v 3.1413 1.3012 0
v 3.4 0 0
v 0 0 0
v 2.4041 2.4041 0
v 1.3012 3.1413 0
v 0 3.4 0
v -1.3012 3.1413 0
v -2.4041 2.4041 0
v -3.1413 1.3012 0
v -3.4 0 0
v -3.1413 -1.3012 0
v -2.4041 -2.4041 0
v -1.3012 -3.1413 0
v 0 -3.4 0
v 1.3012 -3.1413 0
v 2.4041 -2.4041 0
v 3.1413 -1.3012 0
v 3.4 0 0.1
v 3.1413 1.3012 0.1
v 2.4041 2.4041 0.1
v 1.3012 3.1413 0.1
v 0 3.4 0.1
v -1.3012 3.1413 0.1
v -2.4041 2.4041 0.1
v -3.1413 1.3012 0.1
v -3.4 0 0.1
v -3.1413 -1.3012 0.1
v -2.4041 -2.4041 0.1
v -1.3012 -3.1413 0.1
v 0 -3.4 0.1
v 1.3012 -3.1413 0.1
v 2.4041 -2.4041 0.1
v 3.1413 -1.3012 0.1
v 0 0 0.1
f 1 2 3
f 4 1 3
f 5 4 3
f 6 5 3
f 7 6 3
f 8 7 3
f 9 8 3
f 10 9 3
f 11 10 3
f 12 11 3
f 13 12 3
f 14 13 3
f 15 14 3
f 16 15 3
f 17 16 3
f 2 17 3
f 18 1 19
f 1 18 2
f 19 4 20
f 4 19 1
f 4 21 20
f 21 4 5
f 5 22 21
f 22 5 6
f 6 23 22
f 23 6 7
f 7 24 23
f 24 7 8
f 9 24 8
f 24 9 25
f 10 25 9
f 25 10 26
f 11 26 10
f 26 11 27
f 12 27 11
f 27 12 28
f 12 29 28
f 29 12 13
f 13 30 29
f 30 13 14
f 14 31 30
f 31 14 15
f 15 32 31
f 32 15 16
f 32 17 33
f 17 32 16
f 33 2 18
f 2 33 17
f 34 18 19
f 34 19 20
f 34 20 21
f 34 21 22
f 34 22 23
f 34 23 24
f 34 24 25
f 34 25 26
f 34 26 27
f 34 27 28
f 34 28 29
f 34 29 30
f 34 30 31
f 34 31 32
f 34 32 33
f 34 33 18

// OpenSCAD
// file: ../p/4-4cyli.scad
use <../lib.scad>
function ldraw_lib__4_4cyli() = [
// 0 Cylinder 1.0
// 0 Name: 4-4cyli.dat
// 0 Author: James Jessiman
// 0 !LDRAW_ORG Primitive UPDATE 2005-01
// 0 !LICENSE Licensed under CC BY 4.0 : see CAreadme.txt
// 
// 0 BFC CERTIFY CCW
  [0,"BFC","CERTIFY"],
  [0,"BFC","CCW"],
// 
// 0 !HISTORY 1998-12-15 [PTadmin] Official Update 1998-10
// 0 !HISTORY 2002-03-23 [sbliss] Added BFC statement; merged headers from files in distributions LDraw 0.27 and Complete.
// 0 !HISTORY 2002-04-25 [PTadmin] Official Update 2002-02
// 0 !HISTORY 2004-12-14 [guyvivan] BFC CCW
// 0 !HISTORY 2005-12-28 [PTadmin] Official Update 2005-01
// 0 !HISTORY 2007-06-24 [PTadmin] Header formatted for Contributor Agreement
// 0 !HISTORY 2008-07-01 [PTadmin] Official Update 2008-01
// 
// 
// 4 16 1 1 0 0.9239 1 0.3827 0.9239 0 0.3827 1 0 0
  [4,16,1,1,0,0.9239,1,0.3827,0.9239,0,0.3827,1,0,0],
// 5 24 1 0 0 1 1 0 0.9239 0 0.3827 0.9239 0 -0.3827
  [5,24,1,0,0,1,1,0,0.9239,0,0.3827,0.9239,0,-0.3827],
// 4 16 0.9239 1 0.3827 0.7071 1 0.7071 0.7071 0 0.7071 0.9239 0 0.3827
  [4,16,0.9239,1,0.3827,0.7071,1,0.7071,0.7071,0,0.7071,0.9239,0,0.3827],
// 5 24 0.9239 0 0.3827 0.9239 1 0.3827 0.7071 0 0.7071 1 0 0
  [5,24,0.9239,0,0.3827,0.9239,1,0.3827,0.7071,0,0.7071,1,0,0],
// 4 16 0.7071 1 0.7071 0.3827 1 0.9239 0.3827 0 0.9239 0.7071 0 0.7071
  [4,16,0.7071,1,0.7071,0.3827,1,0.9239,0.3827,0,0.9239,0.7071,0,0.7071],
// 5 24 0.7071 0 0.7071 0.7071 1 0.7071 0.3827 0 0.9239 0.9239 0 0.3827
  [5,24,0.7071,0,0.7071,0.7071,1,0.7071,0.3827,0,0.9239,0.9239,0,0.3827],
// 4 16 0.3827 1 0.9239 0 1 1 0 0 1 0.3827 0 0.9239
  [4,16,0.3827,1,0.9239,0,1,1,0,0,1,0.3827,0,0.9239],
// 5 24 0.3827 0 0.9239 0.3827 1 0.9239 0 0 1 0.7071 0 0.7071
  [5,24,0.3827,0,0.9239,0.3827,1,0.9239,0,0,1,0.7071,0,0.7071],
// 4 16 0 1 1 -0.3827 1 0.9239 -0.3827 0 0.9239 0 0 1
  [4,16,0,1,1,-0.3827,1,0.9239,-0.3827,0,0.9239,0,0,1],
// 5 24 0 0 1 0 1 1 -0.3827 0 0.9239 0.3827 0 0.9239
  [5,24,0,0,1,0,1,1,-0.3827,0,0.9239,0.3827,0,0.9239],
// 4 16 -0.3827 1 0.9239 -0.7071 1 0.7071 -0.7071 0 0.7071 -0.3827 0 0.9239
  [4,16,-0.3827,1,0.9239,-0.7071,1,0.7071,-0.7071,0,0.7071,-0.3827,0,0.9239],
// 5 24 -0.3827 0 0.9239 -0.3827 1 0.9239 -0.7071 0 0.7071 0 0 1
  [5,24,-0.3827,0,0.9239,-0.3827,1,0.9239,-0.7071,0,0.7071,0,0,1],
// 4 16 -0.7071 1 0.7071 -0.9239 1 0.3827 -0.9239 0 0.3827 -0.7071 0 0.7071
  [4,16,-0.7071,1,0.7071,-0.9239,1,0.3827,-0.9239,0,0.3827,-0.7071,0,0.7071],
// 5 24 -0.7071 0 0.7071 -0.7071 1 0.7071 -0.9239 0 0.3827 -0.3827 0 0.9239
  [5,24,-0.7071,0,0.7071,-0.7071,1,0.7071,-0.9239,0,0.3827,-0.3827,0,0.9239],
// 4 16 -0.9239 1 0.3827 -1 1 0 -1 0 0 -0.9239 0 0.3827
  [4,16,-0.9239,1,0.3827,-1,1,0,-1,0,0,-0.9239,0,0.3827],
// 5 24 -0.9239 0 0.3827 -0.9239 1 0.3827 -1 0 0 -0.7071 0 0.7071
  [5,24,-0.9239,0,0.3827,-0.9239,1,0.3827,-1,0,0,-0.7071,0,0.7071],
// 4 16 -1 1 0 -0.9239 1 -0.3827 -0.9239 0 -0.3827 -1 0 0
  [4,16,-1,1,0,-0.9239,1,-0.3827,-0.9239,0,-0.3827,-1,0,0],
// 5 24 -1 0 0 -1 1 0 -0.9239 0 -0.3827 -0.9239 0 0.3827
  [5,24,-1,0,0,-1,1,0,-0.9239,0,-0.3827,-0.9239,0,0.3827],
// 4 16 -0.9239 1 -0.3827 -0.7071 1 -0.7071 -0.7071 0 -0.7071 -0.9239 0 -0.3827
  [4,16,-0.9239,1,-0.3827,-0.7071,1,-0.7071,-0.7071,0,-0.7071,-0.9239,0,-0.3827],
// 5 24 -0.9239 0 -0.3827 -0.9239 1 -0.3827 -0.7071 0 -0.7071 -1 0 0
  [5,24,-0.9239,0,-0.3827,-0.9239,1,-0.3827,-0.7071,0,-0.7071,-1,0,0],
// 4 16 -0.7071 1 -0.7071 -0.3827 1 -0.9239 -0.3827 0 -0.9239 -0.7071 0 -0.7071
  [4,16,-0.7071,1,-0.7071,-0.3827,1,-0.9239,-0.3827,0,-0.9239,-0.7071,0,-0.7071],
// 5 24 -0.7071 0 -0.7071 -0.7071 1 -0.7071 -0.3827 0 -0.9239 -0.9239 0 -0.3827
  [5,24,-0.7071,0,-0.7071,-0.7071,1,-0.7071,-0.3827,0,-0.9239,-0.9239,0,-0.3827],
// 4 16 -0.3827 1 -0.9239 0 1 -1 0 0 -1 -0.3827 0 -0.9239
  [4,16,-0.3827,1,-0.9239,0,1,-1,0,0,-1,-0.3827,0,-0.9239],
// 5 24 -0.3827 0 -0.9239 -0.3827 1 -0.9239 0 0 -1 -0.7071 0 -0.7071
  [5,24,-0.3827,0,-0.9239,-0.3827,1,-0.9239,0,0,-1,-0.7071,0,-0.7071],
// 4 16 0 1 -1 0.3827 1 -0.9239 0.3827 0 -0.9239 0 0 -1
  [4,16,0,1,-1,0.3827,1,-0.9239,0.3827,0,-0.9239,0,0,-1],
// 5 24 0 0 -1 0 1 -1 0.3827 0 -0.9239 -0.3827 0 -0.9239
  [5,24,0,0,-1,0,1,-1,0.3827,0,-0.9239,-0.3827,0,-0.9239],
// 4 16 0.3827 1 -0.9239 0.7071 1 -0.7071 0.7071 0 -0.7071 0.3827 0 -0.9239
  [4,16,0.3827,1,-0.9239,0.7071,1,-0.7071,0.7071,0,-0.7071,0.3827,0,-0.9239],
// 5 24 0.3827 0 -0.9239 0.3827 1 -0.9239 0.7071 0 -0.7071 0 0 -1
  [5,24,0.3827,0,-0.9239,0.3827,1,-0.9239,0.7071,0,-0.7071,0,0,-1],
// 4 16 0.7071 1 -0.7071 0.9239 1 -0.3827 0.9239 0 -0.3827 0.7071 0 -0.7071
  [4,16,0.7071,1,-0.7071,0.9239,1,-0.3827,0.9239,0,-0.3827,0.7071,0,-0.7071],
// 5 24 0.7071 0 -0.7071 0.7071 1 -0.7071 0.9239 0 -0.3827 0.3827 0 -0.9239
  [5,24,0.7071,0,-0.7071,0.7071,1,-0.7071,0.9239,0,-0.3827,0.3827,0,-0.9239],
// 4 16 0.9239 1 -0.3827 1 1 0 1 0 0 0.9239 0 -0.3827
  [4,16,0.9239,1,-0.3827,1,1,0,1,0,0,0.9239,0,-0.3827],
// 5 24 0.9239 0 -0.3827 0.9239 1 -0.3827 1 0 0 0.7071 0 -0.7071
  [5,24,0.9239,0,-0.3827,0.9239,1,-0.3827,1,0,0,0.7071,0,-0.7071],
// 0
];
module ldraw_lib__4_4cyli(step=0, col=false, unit=2/5, alt=false, line=0.2, solid=!$preview)
    makepoly(ldraw_lib__4_4cyli(), step=step, col=col, unit=unit, alt=alt, line=line, solid=solid);
ldraw_lib__4_4cyli(line=0.2);
// file: ../p/4-4disc.scad
use <../lib.scad>
function ldraw_lib__4_4disc() = [
// 0 Disc 1.0
// 0 Name: 4-4disc.dat
// 0 Author: James Jessiman
// 0 !LDRAW_ORG Primitive UPDATE 2002-02
// 0 !LICENSE Licensed under CC BY 4.0 : see CAreadme.txt
// 
// 0 BFC CERTIFY CCW
  [0,"BFC","CERTIFY"],
  [0,"BFC","CCW"],
// 
// 0 !HISTORY 1998-12-15 [PTadmin] Official Update 1998-10
// 0 !HISTORY 2002-03-23 [sbliss] Added BFC statement
// 0 !HISTORY 2002-04-25 [PTadmin] Official Update 2002-02
// 0 !HISTORY 2007-06-24 [PTadmin] Header formatted for Contributor Agreement
// 0 !HISTORY 2008-07-01 [PTadmin] Official Update 2008-01
// 
// 
// 3 16 0 0 0 1 0 0 0.9239 0 0.3827
  [3,16,0,0,0,1,0,0,0.9239,0,0.3827],
// 3 16 0 0 0 0.9239 0 0.3827 0.7071 0 0.7071
  [3,16,0,0,0,0.9239,0,0.3827,0.7071,0,0.7071],
// 3 16 0 0 0 0.7071 0 0.7071 0.3827 0 0.9239
  [3,16,0,0,0,0.7071,0,0.7071,0.3827,0,0.9239],
// 3 16 0 0 0 0.3827 0 0.9239 0 0 1
  [3,16,0,0,0,0.3827,0,0.9239,0,0,1],
// 3 16 0 0 0 0 0 1 -0.3827 0 0.9239
  [3,16,0,0,0,0,0,1,-0.3827,0,0.9239],
// 3 16 0 0 0 -0.3827 0 0.9239 -0.7071 0 0.7071
  [3,16,0,0,0,-0.3827,0,0.9239,-0.7071,0,0.7071],
// 3 16 0 0 0 -0.7071 0 0.7071 -0.9239 0 0.3827
  [3,16,0,0,0,-0.7071,0,0.7071,-0.9239,0,0.3827],
// 3 16 0 0 0 -0.9239 0 0.3827 -1 0 -0
  [3,16,0,0,0,-0.9239,0,0.3827,-1,0,-0],
// 3 16 0 0 0 -1 0 -0 -0.9239 0 -0.3827
  [3,16,0,0,0,-1,0,-0,-0.9239,0,-0.3827],
// 3 16 0 0 0 -0.9239 0 -0.3827 -0.7071 0 -0.7071
  [3,16,0,0,0,-0.9239,0,-0.3827,-0.7071,0,-0.7071],
// 3 16 0 0 0 -0.7071 0 -0.7071 -0.3827 0 -0.9239
  [3,16,0,0,0,-0.7071,0,-0.7071,-0.3827,0,-0.9239],
// 3 16 0 0 0 -0.3827 0 -0.9239 0 0 -1
  [3,16,0,0,0,-0.3827,0,-0.9239,0,0,-1],
// 3 16 0 0 0 0 0 -1 0.3827 0 -0.9239
  [3,16,0,0,0,0,0,-1,0.3827,0,-0.9239],
// 3 16 0 0 0 0.3827 0 -0.9239 0.7071 0 -0.7071
  [3,16,0,0,0,0.3827,0,-0.9239,0.7071,0,-0.7071],
// 3 16 0 0 0 0.7071 0 -0.7071 0.9239 0 -0.3827
  [3,16,0,0,0,0.7071,0,-0.7071,0.9239,0,-0.3827],
// 3 16 0 0 0 0.9239 0 -0.3827 1 0 0
  [3,16,0,0,0,0.9239,0,-0.3827,1,0,0],
// 0
];
module ldraw_lib__4_4disc(step=0, col=false, unit=2/5, alt=false, line=0.2, solid=!$preview)
    makepoly(ldraw_lib__4_4disc(), step=step, col=col, unit=unit, alt=alt, line=line, solid=solid);
ldraw_lib__4_4disc(line=0.2);
// file: ../p/4-4cylc3.scad
use <../lib.scad>
use <4-4cyli.scad>
use <4-4disc.scad>
function ldraw_lib__4_4cylc3() = [
// 0 Cylinder Closed 1.0 without Top or Bottom Edge Lines
// 0 Name: 4-4cylc3.dat
// 0 Author: Chris Dee [cwdee]
// 0 !LDRAW_ORG Primitive UPDATE 2017-01
// 0 !LICENSE Licensed under CC BY 4.0 : see CAreadme.txt
// 
// 0 BFC CERTIFY CCW
  [0,"BFC","CERTIFY"],
  [0,"BFC","CCW"],
// 
// 0 !HISTORY 2017-12-30 [PTadmin] Official Update 2017-01
// 
// 
// 1 16 0 0 0 1 0 0 0 1 0 0 0 1 4-4disc.dat
  [1,16,0,0,0,1,0,0,0,1,0,0,0,1, ldraw_lib__4_4disc()],
// 1 16 0 0 0 1 0 0 0 1 0 0 0 1 4-4cyli.dat
  [1,16,0,0,0,1,0,0,0,1,0,0,0,1, ldraw_lib__4_4cyli()],
// 0
];
module ldraw_lib__4_4cylc3(step=0, col=false, unit=2/5, alt=false, line=0.2, solid=!$preview)
    makepoly(ldraw_lib__4_4cylc3(), step=step, col=col, unit=unit, alt=alt, line=line, solid=solid);
ldraw_lib__4_4cylc3(line=0.2);
// main file
use <../lib.scad>
use <../p/4-4cylc3.scad>
use <../p/4-4disc.scad>
function ldraw_lib__6075063a() = [
// 0 Sticker  0.9 x  0.9 Round with Red Surface
// 0 Name: 6075063a.dat
// 0 Author: Gabriel Läufer [Dr.Bricktacular]
// 0 !LDRAW_ORG Part UPDATE 2025-01
// 0 !LICENSE Licensed under CC BY 4.0 : see CAreadme.txt
// 
// 0 BFC CERTIFY CCW
  [0,"BFC","CERTIFY"],
  [0,"BFC","CCW"],
// 
// 0 !KEYWORDS Bricklink 76023stk02, Brickowl 485918, Rebrickable 17688, Set 76023
// 0 !KEYWORDS The Dark Knight Trilogy, The Tumbler
// 
// 0 !HISTORY 2025-01-20 [OrionP] Official Update 2025-01
// 
// 0 // Sticker-Bottom
// 1 16 0 0 0 8.5 0 0 0 -0.25 0 0 0 8.5 4-4cylc3.dat
  [1,16,0,0,0,8.5,0,0,0,-0.25,0,0,0,8.5, ldraw_lib__4_4cylc3()],
// 
// 0 // Sticker-Front
// 1 4 0 -.25 0 8.5 0 0 0 1 0 0 0 8.5 4-4disc.dat
  [1,4,0,-.25,0,8.5,0,0,0,1,0,0,0,8.5, ldraw_lib__4_4disc()],
];
module ldraw_lib__6075063a(step=0, col=false, unit=2/5, alt=false, line=0.2, solid=!$preview)
    makepoly(ldraw_lib__6075063a(), step=step, col=col, unit=unit, alt=alt, line=line, solid=solid);
ldraw_lib__6075063a(line=0.2);
